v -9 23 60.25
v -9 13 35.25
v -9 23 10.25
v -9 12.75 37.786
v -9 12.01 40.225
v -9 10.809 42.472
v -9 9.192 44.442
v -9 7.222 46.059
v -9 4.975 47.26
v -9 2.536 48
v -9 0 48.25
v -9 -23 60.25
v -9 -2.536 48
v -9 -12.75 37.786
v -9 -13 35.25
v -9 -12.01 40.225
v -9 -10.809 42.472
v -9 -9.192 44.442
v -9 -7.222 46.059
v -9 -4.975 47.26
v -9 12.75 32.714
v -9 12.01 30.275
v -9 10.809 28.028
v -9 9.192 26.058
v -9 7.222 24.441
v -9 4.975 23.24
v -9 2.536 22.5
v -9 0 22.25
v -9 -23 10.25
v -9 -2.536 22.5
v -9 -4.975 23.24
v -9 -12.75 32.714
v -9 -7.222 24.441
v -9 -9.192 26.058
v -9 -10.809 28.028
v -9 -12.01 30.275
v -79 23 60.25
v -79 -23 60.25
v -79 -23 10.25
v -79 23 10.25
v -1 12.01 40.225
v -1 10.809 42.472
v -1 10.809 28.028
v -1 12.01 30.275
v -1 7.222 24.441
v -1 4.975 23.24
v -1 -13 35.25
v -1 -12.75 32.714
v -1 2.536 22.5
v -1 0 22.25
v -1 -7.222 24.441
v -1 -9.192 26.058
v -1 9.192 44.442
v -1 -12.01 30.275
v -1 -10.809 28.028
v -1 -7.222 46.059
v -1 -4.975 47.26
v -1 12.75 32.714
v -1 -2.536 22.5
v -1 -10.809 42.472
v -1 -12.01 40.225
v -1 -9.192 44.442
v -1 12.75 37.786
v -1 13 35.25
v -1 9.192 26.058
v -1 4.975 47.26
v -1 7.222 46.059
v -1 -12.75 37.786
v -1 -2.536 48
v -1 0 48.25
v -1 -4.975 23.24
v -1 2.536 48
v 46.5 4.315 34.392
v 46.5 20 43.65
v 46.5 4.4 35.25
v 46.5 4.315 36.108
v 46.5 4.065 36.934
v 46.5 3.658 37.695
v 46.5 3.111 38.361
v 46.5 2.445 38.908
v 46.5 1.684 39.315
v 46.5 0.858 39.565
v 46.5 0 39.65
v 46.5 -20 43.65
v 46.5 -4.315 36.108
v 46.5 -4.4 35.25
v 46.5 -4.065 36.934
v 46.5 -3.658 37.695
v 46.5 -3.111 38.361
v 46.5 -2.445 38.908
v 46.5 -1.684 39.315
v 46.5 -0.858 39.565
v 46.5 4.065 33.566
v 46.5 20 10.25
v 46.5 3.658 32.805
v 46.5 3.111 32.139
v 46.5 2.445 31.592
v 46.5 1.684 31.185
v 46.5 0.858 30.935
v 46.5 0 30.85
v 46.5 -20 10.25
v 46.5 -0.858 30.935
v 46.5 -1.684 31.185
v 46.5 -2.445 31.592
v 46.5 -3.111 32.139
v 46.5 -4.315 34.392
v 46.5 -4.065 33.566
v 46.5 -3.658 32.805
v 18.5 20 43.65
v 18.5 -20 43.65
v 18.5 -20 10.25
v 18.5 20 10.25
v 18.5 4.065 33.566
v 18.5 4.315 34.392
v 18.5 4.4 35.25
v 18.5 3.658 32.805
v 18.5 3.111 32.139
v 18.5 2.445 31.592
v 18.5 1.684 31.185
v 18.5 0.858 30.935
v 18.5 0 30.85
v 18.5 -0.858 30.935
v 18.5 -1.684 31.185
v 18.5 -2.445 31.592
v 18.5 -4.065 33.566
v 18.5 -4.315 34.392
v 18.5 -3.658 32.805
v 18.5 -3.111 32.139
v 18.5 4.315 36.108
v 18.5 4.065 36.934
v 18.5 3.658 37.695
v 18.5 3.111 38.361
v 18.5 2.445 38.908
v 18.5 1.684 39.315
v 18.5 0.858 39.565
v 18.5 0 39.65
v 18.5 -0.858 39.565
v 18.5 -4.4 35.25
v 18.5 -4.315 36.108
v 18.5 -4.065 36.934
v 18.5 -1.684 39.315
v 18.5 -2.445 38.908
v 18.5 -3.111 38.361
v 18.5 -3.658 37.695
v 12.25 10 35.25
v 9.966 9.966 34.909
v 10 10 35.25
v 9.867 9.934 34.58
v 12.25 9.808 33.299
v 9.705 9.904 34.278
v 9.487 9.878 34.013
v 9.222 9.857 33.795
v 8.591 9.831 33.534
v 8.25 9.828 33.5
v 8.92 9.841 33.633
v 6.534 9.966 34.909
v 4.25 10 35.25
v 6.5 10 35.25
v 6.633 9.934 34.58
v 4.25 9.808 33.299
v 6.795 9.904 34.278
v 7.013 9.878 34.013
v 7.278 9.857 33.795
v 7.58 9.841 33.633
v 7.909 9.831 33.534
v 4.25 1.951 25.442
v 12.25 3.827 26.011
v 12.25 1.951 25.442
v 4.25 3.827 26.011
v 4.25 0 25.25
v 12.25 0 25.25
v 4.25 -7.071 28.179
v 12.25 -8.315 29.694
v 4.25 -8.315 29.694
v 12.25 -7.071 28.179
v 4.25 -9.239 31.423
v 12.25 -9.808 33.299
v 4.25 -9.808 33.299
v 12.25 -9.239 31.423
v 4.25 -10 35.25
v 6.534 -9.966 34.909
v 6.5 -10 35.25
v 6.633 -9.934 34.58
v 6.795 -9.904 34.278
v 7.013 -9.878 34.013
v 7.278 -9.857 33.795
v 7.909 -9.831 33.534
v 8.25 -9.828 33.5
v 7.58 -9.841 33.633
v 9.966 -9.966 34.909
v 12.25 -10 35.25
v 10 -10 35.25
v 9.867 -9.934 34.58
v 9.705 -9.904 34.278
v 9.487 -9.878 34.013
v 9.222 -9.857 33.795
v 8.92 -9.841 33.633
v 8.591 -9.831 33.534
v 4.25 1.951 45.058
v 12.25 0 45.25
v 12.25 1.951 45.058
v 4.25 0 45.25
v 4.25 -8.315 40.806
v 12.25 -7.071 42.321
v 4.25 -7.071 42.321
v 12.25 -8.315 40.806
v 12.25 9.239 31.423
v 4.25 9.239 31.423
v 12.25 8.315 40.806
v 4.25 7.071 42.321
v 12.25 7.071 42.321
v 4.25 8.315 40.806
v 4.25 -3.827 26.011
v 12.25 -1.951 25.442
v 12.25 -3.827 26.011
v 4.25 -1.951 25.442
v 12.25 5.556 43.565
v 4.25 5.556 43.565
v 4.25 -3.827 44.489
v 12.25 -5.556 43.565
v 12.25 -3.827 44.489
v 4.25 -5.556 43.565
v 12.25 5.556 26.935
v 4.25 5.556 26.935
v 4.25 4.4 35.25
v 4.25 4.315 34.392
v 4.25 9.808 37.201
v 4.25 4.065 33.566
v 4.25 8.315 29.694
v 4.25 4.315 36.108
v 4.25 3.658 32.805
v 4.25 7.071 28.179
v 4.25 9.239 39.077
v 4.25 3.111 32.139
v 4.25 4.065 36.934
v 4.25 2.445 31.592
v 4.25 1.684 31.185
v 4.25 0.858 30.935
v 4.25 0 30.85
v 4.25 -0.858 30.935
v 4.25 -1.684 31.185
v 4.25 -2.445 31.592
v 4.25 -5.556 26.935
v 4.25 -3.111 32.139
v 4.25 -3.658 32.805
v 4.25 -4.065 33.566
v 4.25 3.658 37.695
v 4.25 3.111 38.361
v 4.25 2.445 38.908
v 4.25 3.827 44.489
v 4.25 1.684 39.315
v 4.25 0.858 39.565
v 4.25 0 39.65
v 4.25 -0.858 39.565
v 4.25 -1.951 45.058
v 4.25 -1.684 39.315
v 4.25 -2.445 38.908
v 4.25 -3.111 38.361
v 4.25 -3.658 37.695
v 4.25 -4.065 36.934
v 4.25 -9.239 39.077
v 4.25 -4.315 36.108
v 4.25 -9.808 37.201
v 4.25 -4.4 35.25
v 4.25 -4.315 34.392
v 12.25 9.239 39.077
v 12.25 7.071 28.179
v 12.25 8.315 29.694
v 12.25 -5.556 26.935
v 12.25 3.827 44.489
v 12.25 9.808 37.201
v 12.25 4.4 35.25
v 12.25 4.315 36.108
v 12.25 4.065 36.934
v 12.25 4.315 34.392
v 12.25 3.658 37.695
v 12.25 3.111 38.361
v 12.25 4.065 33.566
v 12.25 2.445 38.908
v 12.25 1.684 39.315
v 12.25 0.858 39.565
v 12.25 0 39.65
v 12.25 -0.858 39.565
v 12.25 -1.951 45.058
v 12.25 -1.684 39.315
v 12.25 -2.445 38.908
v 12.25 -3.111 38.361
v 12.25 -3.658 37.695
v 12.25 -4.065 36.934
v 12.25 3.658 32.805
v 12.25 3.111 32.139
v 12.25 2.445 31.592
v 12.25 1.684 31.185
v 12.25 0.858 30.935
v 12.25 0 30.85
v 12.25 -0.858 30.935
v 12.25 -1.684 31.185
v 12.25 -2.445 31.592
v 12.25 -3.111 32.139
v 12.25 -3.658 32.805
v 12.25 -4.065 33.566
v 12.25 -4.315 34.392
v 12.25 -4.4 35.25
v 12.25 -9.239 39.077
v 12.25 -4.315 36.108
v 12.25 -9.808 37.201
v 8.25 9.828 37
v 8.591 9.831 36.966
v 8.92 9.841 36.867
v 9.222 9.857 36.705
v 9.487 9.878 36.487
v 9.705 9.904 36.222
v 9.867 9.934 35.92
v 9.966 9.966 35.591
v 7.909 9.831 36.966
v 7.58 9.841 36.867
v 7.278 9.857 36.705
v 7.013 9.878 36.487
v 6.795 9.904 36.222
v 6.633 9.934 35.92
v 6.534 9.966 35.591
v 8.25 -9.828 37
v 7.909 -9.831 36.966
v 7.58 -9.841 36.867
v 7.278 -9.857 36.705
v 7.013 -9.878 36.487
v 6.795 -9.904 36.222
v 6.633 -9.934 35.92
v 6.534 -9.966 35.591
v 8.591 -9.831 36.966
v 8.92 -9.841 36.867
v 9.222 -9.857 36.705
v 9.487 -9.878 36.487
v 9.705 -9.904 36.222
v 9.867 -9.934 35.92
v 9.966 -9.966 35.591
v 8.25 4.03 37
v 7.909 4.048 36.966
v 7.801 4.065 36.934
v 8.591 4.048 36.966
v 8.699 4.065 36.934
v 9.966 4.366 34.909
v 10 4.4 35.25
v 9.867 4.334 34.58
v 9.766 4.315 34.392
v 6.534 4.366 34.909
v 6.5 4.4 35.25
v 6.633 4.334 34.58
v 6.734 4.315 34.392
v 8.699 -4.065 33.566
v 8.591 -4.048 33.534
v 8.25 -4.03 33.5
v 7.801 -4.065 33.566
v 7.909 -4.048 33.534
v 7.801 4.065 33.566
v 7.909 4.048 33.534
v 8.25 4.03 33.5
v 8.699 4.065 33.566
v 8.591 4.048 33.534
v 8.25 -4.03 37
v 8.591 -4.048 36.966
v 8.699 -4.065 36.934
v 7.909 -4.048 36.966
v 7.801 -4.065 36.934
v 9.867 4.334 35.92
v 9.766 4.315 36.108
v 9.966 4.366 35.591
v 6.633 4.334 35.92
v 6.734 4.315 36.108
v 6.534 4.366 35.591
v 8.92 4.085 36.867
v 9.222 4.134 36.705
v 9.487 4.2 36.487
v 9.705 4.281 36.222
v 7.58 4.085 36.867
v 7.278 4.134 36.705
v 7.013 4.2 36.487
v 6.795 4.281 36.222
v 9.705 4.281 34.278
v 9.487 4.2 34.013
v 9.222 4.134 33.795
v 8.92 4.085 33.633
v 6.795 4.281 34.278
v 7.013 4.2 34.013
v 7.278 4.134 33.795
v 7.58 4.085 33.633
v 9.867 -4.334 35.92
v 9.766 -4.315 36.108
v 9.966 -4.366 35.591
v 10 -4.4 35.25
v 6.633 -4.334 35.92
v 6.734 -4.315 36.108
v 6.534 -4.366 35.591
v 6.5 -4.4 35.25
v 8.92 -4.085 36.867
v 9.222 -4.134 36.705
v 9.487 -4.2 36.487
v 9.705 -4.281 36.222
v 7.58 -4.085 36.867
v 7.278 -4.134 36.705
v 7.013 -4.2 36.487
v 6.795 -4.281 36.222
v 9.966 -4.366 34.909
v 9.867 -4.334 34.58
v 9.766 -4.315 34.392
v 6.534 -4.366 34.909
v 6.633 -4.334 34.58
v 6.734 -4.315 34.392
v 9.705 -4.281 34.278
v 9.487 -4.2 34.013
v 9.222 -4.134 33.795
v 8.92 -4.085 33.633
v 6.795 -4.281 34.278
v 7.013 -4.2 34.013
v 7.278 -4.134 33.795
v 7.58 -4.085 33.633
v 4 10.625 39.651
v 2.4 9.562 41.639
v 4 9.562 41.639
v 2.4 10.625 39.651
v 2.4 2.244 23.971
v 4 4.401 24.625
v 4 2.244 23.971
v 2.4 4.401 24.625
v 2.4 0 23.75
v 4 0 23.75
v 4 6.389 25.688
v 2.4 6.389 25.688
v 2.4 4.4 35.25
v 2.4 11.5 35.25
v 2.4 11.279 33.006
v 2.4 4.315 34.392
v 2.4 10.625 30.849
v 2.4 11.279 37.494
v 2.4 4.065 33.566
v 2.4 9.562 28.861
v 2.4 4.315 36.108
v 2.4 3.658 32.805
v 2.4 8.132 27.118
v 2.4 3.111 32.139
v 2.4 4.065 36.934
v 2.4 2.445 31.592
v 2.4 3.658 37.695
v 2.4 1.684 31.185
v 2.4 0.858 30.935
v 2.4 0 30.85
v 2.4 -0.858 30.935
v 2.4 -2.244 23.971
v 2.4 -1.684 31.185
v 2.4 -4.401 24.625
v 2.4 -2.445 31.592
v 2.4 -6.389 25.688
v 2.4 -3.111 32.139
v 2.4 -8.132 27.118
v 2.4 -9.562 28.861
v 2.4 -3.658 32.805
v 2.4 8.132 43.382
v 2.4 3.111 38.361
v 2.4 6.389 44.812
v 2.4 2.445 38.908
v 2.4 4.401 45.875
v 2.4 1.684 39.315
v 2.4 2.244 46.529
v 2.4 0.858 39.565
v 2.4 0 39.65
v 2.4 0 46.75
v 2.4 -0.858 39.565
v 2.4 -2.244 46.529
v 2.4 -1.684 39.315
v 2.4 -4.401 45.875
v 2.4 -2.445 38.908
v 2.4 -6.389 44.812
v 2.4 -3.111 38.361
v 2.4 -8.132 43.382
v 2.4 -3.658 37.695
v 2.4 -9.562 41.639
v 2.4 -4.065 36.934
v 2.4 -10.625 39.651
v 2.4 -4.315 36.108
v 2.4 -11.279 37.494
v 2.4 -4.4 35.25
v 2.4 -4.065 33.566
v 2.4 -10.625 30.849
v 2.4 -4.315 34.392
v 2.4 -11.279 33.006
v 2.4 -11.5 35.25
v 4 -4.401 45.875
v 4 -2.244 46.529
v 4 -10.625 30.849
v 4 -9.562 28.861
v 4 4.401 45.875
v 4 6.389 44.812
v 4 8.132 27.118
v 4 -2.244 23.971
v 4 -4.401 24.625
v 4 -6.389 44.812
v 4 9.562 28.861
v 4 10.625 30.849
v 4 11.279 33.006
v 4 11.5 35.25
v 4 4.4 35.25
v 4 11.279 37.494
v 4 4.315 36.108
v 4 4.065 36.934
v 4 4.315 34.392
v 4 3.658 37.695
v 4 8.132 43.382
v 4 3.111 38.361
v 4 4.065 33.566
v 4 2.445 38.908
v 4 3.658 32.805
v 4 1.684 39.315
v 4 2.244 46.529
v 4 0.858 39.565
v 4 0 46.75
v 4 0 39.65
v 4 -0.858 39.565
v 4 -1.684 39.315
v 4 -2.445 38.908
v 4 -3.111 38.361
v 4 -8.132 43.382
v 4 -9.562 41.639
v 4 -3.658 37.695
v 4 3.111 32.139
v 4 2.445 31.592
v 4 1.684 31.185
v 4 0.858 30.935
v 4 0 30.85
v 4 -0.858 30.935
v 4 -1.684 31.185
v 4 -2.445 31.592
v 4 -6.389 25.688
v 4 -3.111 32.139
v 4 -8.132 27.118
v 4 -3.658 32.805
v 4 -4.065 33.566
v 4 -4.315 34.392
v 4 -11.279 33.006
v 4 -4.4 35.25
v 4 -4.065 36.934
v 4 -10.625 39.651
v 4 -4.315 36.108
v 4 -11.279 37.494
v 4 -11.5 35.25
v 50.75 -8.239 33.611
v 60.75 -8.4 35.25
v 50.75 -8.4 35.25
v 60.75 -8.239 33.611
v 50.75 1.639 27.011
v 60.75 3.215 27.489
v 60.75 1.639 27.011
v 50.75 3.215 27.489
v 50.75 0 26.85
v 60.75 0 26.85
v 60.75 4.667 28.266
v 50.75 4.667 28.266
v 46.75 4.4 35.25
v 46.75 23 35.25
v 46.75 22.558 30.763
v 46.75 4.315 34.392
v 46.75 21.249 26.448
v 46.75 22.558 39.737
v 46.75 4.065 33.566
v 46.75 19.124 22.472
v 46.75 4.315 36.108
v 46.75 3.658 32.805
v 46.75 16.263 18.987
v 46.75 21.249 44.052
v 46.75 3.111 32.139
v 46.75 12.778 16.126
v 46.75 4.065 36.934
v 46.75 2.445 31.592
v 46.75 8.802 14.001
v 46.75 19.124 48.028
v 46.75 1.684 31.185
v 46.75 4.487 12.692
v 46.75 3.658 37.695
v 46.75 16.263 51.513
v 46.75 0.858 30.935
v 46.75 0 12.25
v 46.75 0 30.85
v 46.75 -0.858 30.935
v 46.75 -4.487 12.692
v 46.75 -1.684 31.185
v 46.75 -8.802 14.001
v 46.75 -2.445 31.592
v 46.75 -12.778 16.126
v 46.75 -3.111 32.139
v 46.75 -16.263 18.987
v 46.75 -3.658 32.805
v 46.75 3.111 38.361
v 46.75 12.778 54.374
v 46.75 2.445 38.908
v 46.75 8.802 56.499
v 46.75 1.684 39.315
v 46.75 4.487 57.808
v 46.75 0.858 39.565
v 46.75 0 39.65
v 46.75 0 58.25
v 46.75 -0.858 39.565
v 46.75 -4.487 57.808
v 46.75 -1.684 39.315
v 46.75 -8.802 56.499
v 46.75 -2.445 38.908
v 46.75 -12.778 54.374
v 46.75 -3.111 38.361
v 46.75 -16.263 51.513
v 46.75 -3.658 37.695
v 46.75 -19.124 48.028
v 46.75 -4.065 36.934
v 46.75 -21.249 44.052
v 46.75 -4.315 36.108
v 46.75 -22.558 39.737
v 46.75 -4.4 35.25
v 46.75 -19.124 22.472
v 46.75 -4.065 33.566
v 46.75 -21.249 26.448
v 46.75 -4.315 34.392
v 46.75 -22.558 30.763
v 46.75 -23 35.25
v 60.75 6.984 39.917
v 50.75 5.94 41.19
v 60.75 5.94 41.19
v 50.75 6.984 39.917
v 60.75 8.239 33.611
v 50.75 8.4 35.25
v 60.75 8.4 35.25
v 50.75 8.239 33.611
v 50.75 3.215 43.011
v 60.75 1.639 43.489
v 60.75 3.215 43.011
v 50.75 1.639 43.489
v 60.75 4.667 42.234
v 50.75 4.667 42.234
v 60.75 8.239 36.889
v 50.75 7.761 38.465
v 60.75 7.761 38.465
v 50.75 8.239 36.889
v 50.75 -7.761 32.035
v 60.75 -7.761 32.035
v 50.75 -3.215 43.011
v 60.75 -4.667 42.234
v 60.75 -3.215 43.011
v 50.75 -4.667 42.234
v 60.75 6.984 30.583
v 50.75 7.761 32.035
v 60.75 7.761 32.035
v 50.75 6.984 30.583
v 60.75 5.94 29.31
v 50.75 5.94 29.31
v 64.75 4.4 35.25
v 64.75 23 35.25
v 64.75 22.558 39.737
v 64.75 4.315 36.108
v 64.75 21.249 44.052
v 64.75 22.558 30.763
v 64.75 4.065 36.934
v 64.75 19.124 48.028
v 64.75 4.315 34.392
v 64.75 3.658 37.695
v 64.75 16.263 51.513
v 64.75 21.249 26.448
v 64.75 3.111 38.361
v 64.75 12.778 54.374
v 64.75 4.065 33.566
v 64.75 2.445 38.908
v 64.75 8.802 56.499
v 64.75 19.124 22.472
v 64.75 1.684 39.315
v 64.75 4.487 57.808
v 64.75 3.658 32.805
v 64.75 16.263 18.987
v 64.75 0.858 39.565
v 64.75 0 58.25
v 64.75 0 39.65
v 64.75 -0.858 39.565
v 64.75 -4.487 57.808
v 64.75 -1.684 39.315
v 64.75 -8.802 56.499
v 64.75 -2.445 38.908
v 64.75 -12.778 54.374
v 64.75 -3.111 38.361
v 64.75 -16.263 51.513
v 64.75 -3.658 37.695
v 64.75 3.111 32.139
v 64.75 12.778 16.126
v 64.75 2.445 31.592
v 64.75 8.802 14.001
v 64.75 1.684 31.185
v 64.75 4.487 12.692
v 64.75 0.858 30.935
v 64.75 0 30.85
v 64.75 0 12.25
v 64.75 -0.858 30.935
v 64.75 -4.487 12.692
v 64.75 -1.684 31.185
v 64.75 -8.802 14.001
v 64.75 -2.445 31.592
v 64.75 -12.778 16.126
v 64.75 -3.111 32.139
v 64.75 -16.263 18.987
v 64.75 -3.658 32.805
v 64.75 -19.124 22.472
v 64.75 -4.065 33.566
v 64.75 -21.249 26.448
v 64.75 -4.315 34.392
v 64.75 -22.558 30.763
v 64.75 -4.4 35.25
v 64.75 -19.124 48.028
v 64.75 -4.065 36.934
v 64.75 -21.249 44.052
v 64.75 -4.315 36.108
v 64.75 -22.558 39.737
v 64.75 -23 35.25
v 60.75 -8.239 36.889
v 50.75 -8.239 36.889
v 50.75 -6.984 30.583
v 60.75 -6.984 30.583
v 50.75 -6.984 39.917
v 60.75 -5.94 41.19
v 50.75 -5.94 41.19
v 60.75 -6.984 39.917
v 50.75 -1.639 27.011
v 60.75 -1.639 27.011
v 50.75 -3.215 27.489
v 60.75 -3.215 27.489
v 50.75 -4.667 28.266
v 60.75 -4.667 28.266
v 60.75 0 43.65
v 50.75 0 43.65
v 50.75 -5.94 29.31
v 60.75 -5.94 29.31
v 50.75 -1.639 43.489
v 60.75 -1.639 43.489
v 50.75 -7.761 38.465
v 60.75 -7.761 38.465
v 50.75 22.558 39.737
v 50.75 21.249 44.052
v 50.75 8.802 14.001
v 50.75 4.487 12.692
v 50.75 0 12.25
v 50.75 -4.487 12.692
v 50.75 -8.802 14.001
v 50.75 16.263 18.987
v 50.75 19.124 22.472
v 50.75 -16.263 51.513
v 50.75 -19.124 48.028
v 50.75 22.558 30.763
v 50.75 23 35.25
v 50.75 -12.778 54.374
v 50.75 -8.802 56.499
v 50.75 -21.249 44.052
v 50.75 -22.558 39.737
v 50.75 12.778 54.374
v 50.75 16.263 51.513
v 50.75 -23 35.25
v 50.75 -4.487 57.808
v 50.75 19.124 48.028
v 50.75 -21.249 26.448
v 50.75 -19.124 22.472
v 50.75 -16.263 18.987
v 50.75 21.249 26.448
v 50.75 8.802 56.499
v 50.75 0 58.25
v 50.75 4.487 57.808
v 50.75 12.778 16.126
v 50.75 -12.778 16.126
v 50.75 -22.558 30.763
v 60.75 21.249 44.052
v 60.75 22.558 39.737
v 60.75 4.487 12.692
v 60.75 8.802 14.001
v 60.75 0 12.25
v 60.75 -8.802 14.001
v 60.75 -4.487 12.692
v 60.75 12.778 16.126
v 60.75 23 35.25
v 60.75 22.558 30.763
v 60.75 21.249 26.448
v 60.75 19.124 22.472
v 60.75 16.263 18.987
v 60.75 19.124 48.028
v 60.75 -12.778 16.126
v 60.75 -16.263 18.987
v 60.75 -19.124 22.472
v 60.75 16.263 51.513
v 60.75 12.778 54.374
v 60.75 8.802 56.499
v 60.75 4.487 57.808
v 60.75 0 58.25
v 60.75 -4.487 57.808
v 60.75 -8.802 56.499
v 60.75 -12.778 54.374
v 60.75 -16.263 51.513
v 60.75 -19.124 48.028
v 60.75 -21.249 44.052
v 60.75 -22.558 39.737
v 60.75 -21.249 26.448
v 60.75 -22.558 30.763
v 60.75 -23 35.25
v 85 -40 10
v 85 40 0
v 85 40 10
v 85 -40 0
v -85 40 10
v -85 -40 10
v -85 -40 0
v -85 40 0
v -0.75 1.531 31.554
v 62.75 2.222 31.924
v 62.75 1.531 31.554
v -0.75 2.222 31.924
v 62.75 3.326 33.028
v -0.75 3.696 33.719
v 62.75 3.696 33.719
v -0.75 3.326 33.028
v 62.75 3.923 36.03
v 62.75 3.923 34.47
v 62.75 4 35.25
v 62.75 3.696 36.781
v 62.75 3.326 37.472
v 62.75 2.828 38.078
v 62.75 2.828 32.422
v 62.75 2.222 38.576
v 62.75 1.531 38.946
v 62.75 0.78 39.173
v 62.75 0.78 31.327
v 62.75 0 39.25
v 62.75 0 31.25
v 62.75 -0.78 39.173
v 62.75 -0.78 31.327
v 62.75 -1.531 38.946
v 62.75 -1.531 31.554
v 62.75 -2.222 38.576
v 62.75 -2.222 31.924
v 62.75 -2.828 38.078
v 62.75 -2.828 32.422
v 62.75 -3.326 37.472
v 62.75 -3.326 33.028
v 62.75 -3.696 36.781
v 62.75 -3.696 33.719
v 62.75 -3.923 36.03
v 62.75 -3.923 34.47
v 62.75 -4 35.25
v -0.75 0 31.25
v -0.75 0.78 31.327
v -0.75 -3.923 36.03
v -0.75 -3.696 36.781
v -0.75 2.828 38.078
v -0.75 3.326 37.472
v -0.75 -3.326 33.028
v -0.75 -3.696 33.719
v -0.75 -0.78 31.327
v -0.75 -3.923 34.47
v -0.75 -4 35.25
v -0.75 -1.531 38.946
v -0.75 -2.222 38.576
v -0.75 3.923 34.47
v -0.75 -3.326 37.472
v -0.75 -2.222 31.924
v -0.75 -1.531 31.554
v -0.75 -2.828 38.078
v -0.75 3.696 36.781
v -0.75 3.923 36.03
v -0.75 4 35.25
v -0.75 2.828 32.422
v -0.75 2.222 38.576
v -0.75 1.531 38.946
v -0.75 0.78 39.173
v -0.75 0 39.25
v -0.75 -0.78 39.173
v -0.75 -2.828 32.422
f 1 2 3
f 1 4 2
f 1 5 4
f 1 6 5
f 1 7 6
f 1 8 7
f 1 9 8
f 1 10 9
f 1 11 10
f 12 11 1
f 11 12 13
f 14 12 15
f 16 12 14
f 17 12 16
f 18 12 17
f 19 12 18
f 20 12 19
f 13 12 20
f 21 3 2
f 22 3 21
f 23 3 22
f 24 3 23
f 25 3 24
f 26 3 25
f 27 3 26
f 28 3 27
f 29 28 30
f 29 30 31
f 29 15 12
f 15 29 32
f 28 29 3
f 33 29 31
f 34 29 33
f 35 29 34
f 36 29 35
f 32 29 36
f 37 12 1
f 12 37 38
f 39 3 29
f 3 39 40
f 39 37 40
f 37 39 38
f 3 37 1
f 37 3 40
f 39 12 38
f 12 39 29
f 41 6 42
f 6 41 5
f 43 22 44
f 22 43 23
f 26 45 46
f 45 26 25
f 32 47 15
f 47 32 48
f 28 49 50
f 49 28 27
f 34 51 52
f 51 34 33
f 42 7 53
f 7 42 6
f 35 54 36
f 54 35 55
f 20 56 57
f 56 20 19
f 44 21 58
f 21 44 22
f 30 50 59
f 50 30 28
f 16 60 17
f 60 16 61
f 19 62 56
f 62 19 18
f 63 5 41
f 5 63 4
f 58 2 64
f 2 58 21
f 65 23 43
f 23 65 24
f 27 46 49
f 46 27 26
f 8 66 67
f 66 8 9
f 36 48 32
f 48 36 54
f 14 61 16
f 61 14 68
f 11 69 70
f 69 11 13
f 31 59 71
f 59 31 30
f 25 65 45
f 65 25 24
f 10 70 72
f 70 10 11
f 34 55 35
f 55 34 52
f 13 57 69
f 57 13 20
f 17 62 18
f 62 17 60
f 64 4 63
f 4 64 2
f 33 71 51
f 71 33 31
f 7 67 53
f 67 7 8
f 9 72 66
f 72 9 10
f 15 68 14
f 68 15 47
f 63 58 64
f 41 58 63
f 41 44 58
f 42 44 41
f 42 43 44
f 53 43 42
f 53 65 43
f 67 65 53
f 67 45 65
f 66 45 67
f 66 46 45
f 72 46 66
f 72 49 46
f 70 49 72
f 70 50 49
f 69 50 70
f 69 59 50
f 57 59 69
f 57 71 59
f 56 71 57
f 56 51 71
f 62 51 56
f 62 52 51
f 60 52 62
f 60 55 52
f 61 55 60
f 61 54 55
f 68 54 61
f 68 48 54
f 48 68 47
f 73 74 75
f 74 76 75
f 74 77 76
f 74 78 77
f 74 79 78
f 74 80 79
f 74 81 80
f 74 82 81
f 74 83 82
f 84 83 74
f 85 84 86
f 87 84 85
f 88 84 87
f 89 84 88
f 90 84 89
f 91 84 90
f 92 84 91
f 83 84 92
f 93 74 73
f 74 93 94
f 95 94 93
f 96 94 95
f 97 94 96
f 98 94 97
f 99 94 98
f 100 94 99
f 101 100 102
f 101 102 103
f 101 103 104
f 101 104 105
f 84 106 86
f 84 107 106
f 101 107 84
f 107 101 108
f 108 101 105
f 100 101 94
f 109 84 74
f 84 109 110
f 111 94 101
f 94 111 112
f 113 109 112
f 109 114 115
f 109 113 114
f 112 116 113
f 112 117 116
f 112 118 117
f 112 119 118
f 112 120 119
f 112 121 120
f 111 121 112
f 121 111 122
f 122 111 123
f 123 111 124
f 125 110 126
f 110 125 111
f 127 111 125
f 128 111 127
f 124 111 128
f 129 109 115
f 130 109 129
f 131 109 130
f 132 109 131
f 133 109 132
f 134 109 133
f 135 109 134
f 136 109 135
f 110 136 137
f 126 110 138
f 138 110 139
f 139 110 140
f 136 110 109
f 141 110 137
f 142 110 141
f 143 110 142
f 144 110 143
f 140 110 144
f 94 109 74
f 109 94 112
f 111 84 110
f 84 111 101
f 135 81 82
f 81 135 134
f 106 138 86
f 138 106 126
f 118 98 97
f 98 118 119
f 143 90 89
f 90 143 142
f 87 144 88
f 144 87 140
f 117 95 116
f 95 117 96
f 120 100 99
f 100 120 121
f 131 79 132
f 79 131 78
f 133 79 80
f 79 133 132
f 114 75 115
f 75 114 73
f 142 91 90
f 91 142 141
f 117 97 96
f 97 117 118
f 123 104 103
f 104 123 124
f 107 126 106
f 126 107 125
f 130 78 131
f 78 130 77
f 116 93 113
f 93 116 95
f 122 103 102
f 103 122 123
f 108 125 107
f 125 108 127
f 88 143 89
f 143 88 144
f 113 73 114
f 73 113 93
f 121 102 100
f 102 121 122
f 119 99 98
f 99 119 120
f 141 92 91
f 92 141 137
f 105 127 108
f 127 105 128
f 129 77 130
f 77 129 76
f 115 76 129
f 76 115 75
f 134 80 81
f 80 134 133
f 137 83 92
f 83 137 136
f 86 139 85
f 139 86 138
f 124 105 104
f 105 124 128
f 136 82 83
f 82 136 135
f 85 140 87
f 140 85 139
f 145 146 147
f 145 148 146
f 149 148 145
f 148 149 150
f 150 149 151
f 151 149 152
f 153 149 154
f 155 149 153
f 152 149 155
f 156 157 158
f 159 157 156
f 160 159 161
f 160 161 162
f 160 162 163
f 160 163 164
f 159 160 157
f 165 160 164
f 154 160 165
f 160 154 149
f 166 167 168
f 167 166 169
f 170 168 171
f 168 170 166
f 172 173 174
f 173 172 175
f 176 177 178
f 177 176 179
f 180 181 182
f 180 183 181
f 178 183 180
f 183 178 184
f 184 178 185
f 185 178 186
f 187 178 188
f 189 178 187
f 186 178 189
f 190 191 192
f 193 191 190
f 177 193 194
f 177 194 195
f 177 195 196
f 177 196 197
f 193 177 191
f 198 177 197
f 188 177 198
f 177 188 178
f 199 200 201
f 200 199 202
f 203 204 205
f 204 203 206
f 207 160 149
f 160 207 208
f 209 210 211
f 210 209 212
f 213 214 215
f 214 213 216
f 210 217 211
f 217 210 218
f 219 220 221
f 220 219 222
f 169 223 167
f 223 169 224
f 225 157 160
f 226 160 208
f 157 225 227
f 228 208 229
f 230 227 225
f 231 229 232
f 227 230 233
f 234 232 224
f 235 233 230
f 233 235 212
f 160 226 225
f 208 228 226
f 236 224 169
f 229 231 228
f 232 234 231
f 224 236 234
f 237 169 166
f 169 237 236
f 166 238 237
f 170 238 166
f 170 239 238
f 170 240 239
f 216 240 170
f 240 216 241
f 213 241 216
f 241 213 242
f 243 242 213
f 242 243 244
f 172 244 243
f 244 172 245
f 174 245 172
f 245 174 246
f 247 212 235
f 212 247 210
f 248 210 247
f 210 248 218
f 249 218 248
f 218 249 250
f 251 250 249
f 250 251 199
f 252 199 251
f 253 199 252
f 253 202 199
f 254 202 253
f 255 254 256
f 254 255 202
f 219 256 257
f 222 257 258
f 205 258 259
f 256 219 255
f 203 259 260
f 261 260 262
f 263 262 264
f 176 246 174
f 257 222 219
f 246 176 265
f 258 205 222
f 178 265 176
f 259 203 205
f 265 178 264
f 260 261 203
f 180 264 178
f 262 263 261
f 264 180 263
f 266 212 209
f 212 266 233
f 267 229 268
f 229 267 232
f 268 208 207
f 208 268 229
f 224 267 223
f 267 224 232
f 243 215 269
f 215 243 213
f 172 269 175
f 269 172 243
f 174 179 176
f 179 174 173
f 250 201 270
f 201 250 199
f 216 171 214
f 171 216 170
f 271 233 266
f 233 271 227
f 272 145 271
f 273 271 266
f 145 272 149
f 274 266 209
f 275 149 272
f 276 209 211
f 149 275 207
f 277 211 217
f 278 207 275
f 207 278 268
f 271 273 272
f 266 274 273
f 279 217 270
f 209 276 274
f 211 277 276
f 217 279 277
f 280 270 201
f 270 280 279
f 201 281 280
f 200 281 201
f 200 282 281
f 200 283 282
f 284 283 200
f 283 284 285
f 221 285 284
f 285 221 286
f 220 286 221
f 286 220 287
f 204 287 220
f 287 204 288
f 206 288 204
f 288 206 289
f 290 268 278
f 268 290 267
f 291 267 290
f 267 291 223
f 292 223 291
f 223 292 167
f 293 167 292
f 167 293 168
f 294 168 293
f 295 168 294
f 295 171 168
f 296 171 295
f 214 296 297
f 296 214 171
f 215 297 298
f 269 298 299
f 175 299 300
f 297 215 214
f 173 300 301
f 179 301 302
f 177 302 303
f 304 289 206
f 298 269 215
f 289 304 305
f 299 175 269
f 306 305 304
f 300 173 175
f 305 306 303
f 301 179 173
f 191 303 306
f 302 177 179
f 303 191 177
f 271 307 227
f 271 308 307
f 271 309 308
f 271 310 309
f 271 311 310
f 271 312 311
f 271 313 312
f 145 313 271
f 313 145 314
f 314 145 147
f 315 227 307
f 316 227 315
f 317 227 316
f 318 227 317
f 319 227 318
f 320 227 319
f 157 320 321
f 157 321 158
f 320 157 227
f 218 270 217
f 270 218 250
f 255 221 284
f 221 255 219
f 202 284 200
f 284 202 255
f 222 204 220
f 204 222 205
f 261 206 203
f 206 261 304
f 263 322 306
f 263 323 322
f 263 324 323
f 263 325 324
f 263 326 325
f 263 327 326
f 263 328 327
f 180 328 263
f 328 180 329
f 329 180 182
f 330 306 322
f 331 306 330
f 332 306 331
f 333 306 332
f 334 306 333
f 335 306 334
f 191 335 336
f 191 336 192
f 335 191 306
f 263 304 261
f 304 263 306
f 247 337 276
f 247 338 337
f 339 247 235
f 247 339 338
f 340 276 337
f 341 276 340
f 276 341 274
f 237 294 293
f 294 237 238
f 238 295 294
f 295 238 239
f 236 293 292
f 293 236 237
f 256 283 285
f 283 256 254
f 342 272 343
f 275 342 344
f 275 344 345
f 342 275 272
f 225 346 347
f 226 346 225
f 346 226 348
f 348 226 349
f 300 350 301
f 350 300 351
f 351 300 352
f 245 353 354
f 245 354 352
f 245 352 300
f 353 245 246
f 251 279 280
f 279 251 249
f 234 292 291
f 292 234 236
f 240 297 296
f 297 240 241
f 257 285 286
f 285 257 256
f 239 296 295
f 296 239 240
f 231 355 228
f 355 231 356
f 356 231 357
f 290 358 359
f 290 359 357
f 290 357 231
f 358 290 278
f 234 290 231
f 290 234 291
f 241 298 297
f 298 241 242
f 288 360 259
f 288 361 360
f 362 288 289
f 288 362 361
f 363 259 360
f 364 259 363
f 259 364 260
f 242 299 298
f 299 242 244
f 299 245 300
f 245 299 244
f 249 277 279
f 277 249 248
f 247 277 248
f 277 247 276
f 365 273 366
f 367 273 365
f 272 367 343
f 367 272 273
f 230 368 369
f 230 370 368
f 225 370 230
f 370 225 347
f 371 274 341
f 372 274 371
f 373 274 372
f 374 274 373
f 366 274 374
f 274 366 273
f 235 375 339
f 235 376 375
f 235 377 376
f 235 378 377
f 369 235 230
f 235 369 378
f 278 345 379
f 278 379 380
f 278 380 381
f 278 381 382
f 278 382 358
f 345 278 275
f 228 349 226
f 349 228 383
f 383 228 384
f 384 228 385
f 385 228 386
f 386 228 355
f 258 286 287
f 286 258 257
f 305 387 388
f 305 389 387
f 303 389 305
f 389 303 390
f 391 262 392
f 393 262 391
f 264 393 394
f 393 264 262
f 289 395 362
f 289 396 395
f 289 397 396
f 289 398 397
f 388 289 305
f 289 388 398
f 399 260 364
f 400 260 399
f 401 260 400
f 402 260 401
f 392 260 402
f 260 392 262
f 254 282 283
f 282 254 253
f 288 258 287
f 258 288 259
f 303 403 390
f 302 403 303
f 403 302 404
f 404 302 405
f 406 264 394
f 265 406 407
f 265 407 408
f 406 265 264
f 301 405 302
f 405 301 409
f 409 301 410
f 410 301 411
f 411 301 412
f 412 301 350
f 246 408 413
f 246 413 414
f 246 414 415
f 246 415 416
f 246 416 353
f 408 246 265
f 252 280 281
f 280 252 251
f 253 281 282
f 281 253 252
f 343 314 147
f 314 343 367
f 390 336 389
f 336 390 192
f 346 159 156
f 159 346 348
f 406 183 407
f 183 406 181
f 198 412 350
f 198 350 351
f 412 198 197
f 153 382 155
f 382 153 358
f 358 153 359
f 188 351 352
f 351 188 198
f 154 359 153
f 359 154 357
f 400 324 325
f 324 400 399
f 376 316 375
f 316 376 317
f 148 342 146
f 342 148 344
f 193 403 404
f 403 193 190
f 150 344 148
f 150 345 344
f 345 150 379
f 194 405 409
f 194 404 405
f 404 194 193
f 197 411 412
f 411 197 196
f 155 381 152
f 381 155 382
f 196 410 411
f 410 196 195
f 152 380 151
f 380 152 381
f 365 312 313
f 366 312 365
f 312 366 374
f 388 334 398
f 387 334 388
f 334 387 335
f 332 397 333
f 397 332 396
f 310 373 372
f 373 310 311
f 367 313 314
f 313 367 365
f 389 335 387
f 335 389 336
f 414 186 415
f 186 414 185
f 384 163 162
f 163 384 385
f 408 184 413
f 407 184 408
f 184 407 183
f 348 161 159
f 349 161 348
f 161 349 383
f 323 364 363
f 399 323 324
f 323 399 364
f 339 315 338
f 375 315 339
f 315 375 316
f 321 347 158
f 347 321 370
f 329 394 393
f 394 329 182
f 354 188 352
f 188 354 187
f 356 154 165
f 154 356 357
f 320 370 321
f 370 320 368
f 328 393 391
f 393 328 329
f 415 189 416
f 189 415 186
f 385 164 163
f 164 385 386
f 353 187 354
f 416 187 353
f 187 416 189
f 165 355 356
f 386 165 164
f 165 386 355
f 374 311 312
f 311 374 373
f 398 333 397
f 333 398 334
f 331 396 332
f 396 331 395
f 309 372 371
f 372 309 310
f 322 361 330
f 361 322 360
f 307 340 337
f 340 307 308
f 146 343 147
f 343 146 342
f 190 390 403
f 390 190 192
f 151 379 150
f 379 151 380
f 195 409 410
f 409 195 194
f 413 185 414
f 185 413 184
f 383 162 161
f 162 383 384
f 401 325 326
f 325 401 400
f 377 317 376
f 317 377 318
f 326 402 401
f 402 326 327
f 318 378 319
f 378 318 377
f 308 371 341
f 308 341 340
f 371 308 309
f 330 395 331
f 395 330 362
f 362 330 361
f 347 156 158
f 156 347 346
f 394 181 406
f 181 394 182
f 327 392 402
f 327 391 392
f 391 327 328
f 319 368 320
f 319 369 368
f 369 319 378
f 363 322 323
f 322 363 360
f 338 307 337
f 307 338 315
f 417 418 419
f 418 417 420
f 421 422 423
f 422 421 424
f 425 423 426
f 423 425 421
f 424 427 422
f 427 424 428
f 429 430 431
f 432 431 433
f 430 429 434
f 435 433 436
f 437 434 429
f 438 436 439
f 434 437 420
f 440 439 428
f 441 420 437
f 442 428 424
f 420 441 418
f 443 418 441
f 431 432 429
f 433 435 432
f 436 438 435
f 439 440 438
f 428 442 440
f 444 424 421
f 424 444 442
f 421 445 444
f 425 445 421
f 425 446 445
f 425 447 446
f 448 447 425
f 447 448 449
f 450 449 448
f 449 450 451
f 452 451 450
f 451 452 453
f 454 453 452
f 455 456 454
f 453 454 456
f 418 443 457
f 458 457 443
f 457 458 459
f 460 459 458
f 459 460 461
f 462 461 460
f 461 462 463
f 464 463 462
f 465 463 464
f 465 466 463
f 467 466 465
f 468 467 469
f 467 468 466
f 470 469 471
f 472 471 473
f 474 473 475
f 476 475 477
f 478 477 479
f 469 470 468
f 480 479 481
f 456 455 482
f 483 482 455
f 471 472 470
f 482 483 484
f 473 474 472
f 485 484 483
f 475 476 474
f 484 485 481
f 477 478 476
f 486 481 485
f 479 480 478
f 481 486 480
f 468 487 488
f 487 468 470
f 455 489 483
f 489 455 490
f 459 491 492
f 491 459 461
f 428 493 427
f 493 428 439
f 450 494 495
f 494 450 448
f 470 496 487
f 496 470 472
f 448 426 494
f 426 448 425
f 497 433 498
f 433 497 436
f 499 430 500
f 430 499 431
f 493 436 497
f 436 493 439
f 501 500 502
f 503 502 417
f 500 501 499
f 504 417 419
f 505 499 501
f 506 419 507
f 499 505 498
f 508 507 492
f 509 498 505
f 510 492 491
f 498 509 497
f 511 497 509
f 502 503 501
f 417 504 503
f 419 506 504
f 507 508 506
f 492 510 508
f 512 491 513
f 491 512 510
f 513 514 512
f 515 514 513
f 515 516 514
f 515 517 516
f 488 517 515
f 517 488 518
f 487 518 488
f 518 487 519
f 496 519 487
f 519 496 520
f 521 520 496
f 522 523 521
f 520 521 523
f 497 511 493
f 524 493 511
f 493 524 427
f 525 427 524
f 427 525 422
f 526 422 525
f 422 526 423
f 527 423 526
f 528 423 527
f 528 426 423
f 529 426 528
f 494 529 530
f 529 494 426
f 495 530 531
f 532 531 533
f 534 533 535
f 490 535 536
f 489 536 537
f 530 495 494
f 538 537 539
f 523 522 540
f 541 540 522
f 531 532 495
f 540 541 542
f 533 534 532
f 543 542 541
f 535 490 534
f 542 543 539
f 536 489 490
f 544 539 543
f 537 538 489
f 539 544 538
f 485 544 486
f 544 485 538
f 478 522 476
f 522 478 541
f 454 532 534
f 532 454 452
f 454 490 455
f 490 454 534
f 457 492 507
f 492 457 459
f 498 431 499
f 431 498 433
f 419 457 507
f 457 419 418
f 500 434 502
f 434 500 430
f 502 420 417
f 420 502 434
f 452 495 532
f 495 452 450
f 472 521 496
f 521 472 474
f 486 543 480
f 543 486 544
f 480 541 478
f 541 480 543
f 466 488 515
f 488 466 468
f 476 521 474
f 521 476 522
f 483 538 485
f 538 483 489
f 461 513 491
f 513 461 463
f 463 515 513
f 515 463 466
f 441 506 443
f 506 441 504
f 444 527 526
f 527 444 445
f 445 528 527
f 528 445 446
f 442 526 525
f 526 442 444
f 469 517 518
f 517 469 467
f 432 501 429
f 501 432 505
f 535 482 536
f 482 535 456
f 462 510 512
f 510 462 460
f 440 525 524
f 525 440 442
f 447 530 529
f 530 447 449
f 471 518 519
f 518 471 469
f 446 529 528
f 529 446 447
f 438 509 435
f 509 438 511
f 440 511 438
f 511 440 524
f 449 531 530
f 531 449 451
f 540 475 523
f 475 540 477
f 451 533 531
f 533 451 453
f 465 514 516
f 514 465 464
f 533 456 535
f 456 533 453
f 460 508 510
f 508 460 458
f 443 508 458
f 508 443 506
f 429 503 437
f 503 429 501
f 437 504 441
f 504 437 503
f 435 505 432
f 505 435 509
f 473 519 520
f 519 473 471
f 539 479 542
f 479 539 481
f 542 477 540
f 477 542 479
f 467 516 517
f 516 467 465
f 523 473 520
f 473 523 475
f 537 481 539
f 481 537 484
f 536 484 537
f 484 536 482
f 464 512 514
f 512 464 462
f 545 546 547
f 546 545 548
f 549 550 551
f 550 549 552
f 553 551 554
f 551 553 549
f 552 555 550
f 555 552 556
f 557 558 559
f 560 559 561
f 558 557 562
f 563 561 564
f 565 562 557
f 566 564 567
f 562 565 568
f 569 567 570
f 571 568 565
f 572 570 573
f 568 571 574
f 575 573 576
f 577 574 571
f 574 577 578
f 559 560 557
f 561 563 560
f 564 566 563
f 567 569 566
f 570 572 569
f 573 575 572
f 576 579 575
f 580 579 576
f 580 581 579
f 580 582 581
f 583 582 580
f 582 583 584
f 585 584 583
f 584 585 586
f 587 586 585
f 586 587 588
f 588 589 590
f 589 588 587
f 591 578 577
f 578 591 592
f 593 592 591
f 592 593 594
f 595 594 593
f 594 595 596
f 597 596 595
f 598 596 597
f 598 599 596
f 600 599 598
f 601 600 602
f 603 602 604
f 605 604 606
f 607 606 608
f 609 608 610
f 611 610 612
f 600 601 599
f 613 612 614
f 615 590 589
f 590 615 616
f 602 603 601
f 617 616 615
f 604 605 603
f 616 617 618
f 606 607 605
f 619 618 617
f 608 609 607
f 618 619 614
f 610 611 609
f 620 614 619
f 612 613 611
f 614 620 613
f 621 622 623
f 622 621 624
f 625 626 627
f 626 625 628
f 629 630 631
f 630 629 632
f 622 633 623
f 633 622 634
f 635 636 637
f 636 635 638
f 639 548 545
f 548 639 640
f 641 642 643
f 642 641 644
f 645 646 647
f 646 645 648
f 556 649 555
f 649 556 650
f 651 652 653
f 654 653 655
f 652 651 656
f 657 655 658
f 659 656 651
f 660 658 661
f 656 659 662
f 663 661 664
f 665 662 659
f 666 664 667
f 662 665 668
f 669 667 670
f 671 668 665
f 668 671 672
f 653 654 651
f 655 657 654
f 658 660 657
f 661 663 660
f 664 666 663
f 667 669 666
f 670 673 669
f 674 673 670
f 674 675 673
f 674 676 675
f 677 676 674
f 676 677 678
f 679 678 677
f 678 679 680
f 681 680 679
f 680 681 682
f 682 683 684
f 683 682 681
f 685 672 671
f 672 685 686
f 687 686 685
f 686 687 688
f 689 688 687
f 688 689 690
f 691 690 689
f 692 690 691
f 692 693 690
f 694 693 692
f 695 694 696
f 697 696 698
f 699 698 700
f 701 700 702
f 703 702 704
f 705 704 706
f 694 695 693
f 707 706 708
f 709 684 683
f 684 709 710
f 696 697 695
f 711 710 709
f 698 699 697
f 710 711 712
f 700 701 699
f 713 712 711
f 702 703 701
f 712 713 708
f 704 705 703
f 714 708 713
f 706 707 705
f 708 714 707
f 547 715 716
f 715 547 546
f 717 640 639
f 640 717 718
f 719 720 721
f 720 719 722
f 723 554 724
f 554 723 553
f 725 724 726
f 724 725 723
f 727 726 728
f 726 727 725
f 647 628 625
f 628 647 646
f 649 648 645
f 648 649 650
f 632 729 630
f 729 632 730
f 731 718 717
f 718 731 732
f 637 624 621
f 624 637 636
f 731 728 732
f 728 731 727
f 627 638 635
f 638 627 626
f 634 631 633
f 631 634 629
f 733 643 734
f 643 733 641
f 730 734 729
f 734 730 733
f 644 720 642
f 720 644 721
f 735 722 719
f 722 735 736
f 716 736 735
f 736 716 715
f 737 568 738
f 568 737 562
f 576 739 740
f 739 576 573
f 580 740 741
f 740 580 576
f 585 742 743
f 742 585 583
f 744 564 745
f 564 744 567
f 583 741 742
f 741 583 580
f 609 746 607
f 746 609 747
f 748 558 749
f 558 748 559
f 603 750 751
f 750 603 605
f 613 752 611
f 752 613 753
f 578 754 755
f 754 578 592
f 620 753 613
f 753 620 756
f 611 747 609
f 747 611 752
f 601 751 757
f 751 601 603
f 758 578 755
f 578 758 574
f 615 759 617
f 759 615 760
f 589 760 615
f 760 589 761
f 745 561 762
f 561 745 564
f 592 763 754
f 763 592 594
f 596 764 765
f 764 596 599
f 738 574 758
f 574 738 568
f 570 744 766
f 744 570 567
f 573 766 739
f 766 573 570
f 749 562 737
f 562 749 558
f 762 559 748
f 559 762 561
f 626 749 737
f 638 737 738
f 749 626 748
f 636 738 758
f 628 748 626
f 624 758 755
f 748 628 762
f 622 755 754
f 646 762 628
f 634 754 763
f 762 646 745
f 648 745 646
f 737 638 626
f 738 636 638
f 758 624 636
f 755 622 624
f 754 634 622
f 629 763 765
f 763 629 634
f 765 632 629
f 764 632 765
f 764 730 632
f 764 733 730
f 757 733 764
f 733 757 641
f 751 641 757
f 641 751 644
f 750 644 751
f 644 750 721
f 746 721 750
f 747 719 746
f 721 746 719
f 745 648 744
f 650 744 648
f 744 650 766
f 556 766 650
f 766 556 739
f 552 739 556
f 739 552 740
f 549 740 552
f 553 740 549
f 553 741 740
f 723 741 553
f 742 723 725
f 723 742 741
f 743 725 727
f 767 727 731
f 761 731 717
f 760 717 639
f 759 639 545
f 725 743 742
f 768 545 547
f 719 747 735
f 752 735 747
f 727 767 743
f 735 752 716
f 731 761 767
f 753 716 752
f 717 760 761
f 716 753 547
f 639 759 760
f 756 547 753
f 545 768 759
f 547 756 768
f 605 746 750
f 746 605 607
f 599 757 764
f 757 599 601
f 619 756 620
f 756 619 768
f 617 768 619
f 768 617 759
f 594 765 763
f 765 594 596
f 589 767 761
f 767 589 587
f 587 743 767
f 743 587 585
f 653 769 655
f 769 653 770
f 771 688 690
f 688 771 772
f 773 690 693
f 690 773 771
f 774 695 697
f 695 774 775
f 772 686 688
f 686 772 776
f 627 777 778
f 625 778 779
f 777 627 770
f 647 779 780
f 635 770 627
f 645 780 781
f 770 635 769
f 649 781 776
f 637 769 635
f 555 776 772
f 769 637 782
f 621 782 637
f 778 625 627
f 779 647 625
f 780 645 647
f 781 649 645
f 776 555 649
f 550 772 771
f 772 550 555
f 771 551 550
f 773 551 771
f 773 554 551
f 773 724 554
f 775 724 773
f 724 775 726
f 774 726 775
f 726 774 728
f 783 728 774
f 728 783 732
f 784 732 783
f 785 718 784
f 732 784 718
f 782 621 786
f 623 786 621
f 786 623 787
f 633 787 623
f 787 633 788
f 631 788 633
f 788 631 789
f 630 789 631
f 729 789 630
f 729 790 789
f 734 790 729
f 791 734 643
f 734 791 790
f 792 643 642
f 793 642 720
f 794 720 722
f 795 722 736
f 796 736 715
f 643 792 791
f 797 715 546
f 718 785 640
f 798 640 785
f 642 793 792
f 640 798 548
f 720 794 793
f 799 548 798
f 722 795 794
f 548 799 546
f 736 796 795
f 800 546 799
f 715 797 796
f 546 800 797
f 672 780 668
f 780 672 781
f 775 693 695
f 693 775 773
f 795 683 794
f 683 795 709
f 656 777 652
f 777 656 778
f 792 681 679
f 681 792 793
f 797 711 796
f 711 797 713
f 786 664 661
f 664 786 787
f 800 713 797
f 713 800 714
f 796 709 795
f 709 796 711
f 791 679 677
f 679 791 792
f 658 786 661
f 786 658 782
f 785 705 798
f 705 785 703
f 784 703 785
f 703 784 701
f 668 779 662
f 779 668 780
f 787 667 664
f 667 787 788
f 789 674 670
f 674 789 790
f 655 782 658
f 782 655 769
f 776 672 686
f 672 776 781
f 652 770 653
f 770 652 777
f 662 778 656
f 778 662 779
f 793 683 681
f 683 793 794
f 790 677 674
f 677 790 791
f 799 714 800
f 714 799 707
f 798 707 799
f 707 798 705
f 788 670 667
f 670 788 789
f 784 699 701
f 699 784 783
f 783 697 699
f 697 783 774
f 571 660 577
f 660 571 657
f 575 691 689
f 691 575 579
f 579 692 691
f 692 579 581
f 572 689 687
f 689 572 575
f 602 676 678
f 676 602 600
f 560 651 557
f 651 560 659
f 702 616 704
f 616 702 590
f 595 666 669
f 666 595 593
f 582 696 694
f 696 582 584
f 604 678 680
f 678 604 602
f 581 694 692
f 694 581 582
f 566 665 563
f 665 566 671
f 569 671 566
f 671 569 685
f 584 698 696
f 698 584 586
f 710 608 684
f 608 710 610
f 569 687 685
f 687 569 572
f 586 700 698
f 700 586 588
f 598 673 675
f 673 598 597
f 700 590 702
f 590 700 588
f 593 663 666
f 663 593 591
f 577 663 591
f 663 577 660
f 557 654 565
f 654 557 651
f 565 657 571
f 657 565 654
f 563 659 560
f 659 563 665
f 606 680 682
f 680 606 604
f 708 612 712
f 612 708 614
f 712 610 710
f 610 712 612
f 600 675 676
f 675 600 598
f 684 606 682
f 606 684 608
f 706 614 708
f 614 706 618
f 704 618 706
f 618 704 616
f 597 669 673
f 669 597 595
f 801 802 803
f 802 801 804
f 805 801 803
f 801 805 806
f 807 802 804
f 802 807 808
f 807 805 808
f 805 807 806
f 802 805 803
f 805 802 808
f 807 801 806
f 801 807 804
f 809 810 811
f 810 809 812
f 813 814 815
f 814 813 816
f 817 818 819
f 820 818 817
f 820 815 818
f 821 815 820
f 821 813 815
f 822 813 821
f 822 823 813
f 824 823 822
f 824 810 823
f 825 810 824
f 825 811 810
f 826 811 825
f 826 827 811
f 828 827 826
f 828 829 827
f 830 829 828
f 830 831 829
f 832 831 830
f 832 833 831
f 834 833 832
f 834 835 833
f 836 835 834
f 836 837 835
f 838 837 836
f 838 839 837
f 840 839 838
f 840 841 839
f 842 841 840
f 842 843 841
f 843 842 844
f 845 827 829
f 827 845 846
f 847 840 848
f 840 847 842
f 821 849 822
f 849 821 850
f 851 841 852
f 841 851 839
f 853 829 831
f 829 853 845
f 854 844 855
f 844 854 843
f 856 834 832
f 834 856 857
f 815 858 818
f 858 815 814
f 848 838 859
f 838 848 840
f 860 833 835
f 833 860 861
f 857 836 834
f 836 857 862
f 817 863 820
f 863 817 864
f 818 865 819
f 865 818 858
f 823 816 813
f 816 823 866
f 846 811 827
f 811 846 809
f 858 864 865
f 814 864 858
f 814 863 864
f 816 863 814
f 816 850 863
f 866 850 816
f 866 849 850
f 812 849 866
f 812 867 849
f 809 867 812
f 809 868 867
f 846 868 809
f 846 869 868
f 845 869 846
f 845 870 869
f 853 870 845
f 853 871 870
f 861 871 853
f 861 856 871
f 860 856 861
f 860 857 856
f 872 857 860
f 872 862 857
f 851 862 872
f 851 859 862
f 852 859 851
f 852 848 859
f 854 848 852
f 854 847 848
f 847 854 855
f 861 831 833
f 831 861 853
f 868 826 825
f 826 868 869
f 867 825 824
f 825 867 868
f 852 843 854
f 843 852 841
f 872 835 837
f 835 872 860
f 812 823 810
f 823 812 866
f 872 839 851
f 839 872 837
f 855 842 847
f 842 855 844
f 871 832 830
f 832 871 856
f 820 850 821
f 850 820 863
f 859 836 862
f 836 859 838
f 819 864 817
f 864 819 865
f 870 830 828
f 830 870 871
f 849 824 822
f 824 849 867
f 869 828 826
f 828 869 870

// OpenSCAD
$fn = 32;

// ------------------------------------------------------------------------
// Motor drive station: motor 70 x 50 mm, shaft d8, pulley d46
// Every part is its own module, assembly() places every instance.
// ------------------------------------------------------------------------

// --- part 1 ---
module station_bed() {
  difference() {
    translate([-85, -40, 0]) cube([170, 80, 10]);
  }
}

// --- part 2 ---
module drive_motor() {
  union() {
    translate([-35, -23, 0]) cube([70, 46, 50]);
    translate([39, 0, 25]) rotate([0, 90, 0]) cylinder(h = 8, d = 26, center = true);
  }
}

// --- part 3 ---
module pillow_block() {
  difference() {
    translate([-14, -20, 0]) cube([28, 40, 33.4]);
    translate([0, 0, 25]) rotate([0, 90, 0]) cylinder(h = 30, d = 8.8, center = true);
  }
}

// --- part 4 ---
module drive_shaft() {
  translate([0, 0, -31.75]) cylinder(h = 63.5, d = 8);
}

// --- part 5 ---
module shaft_collar() {
  difference() {
    cylinder(h = 8, d = 20);
    translate([0, 0, -1]) cylinder(h = 10, d = 8.8);
    translate([0, 0, 4]) rotate([90, 0, 0]) cylinder(h = 22, d = 3.5, center = true);
  }
}

// --- part 6 ---
module collar_washer() {
  difference() {
      translate([0, 0, 0]) cylinder(h = 1.6, d = 23);
      translate([0, 0, -1]) cylinder(h = 3.6, d = 8.8);
    }
}

// --- part 7 ---
module drive_pulley() {
  difference() {
    union() {
      cylinder(h = 18, d = 16.8);
      cylinder(h = 4, d = 46);
      translate([0, 0, 14]) cylinder(h = 4, d = 46);
    }
    translate([0, 0, -1]) cylinder(h = 20, d = 8.8);
  }
}

// --- assembly ---
module assembly() {
  color([0.80, 0.24, 0.20]) translate([0, 0, 0]) rotate([0, 0, 0]) station_bed();
  color([0.20, 0.45, 0.75]) translate([-44, 0, 10.25]) rotate([0, 0, 0]) drive_motor();
  color([0.25, 0.62, 0.32]) translate([32.5, 0, 10.25]) rotate([0, 0, 0]) pillow_block();
  color([0.92, 0.70, 0.18]) translate([31, 0, 35.25]) rotate([0, 90, 0]) drive_shaft();
  color([0.58, 0.35, 0.70]) translate([4.25, 0, 35.25]) rotate([0, 90, 0]) shaft_collar();
  color([0.16, 0.66, 0.66]) translate([2.4, 0, 35.25]) rotate([0, 90, 0]) collar_washer();
  color([0.85, 0.48, 0.18]) translate([46.75, 0, 35.25]) rotate([0, 90, 0]) drive_pulley();
}

assembly();
